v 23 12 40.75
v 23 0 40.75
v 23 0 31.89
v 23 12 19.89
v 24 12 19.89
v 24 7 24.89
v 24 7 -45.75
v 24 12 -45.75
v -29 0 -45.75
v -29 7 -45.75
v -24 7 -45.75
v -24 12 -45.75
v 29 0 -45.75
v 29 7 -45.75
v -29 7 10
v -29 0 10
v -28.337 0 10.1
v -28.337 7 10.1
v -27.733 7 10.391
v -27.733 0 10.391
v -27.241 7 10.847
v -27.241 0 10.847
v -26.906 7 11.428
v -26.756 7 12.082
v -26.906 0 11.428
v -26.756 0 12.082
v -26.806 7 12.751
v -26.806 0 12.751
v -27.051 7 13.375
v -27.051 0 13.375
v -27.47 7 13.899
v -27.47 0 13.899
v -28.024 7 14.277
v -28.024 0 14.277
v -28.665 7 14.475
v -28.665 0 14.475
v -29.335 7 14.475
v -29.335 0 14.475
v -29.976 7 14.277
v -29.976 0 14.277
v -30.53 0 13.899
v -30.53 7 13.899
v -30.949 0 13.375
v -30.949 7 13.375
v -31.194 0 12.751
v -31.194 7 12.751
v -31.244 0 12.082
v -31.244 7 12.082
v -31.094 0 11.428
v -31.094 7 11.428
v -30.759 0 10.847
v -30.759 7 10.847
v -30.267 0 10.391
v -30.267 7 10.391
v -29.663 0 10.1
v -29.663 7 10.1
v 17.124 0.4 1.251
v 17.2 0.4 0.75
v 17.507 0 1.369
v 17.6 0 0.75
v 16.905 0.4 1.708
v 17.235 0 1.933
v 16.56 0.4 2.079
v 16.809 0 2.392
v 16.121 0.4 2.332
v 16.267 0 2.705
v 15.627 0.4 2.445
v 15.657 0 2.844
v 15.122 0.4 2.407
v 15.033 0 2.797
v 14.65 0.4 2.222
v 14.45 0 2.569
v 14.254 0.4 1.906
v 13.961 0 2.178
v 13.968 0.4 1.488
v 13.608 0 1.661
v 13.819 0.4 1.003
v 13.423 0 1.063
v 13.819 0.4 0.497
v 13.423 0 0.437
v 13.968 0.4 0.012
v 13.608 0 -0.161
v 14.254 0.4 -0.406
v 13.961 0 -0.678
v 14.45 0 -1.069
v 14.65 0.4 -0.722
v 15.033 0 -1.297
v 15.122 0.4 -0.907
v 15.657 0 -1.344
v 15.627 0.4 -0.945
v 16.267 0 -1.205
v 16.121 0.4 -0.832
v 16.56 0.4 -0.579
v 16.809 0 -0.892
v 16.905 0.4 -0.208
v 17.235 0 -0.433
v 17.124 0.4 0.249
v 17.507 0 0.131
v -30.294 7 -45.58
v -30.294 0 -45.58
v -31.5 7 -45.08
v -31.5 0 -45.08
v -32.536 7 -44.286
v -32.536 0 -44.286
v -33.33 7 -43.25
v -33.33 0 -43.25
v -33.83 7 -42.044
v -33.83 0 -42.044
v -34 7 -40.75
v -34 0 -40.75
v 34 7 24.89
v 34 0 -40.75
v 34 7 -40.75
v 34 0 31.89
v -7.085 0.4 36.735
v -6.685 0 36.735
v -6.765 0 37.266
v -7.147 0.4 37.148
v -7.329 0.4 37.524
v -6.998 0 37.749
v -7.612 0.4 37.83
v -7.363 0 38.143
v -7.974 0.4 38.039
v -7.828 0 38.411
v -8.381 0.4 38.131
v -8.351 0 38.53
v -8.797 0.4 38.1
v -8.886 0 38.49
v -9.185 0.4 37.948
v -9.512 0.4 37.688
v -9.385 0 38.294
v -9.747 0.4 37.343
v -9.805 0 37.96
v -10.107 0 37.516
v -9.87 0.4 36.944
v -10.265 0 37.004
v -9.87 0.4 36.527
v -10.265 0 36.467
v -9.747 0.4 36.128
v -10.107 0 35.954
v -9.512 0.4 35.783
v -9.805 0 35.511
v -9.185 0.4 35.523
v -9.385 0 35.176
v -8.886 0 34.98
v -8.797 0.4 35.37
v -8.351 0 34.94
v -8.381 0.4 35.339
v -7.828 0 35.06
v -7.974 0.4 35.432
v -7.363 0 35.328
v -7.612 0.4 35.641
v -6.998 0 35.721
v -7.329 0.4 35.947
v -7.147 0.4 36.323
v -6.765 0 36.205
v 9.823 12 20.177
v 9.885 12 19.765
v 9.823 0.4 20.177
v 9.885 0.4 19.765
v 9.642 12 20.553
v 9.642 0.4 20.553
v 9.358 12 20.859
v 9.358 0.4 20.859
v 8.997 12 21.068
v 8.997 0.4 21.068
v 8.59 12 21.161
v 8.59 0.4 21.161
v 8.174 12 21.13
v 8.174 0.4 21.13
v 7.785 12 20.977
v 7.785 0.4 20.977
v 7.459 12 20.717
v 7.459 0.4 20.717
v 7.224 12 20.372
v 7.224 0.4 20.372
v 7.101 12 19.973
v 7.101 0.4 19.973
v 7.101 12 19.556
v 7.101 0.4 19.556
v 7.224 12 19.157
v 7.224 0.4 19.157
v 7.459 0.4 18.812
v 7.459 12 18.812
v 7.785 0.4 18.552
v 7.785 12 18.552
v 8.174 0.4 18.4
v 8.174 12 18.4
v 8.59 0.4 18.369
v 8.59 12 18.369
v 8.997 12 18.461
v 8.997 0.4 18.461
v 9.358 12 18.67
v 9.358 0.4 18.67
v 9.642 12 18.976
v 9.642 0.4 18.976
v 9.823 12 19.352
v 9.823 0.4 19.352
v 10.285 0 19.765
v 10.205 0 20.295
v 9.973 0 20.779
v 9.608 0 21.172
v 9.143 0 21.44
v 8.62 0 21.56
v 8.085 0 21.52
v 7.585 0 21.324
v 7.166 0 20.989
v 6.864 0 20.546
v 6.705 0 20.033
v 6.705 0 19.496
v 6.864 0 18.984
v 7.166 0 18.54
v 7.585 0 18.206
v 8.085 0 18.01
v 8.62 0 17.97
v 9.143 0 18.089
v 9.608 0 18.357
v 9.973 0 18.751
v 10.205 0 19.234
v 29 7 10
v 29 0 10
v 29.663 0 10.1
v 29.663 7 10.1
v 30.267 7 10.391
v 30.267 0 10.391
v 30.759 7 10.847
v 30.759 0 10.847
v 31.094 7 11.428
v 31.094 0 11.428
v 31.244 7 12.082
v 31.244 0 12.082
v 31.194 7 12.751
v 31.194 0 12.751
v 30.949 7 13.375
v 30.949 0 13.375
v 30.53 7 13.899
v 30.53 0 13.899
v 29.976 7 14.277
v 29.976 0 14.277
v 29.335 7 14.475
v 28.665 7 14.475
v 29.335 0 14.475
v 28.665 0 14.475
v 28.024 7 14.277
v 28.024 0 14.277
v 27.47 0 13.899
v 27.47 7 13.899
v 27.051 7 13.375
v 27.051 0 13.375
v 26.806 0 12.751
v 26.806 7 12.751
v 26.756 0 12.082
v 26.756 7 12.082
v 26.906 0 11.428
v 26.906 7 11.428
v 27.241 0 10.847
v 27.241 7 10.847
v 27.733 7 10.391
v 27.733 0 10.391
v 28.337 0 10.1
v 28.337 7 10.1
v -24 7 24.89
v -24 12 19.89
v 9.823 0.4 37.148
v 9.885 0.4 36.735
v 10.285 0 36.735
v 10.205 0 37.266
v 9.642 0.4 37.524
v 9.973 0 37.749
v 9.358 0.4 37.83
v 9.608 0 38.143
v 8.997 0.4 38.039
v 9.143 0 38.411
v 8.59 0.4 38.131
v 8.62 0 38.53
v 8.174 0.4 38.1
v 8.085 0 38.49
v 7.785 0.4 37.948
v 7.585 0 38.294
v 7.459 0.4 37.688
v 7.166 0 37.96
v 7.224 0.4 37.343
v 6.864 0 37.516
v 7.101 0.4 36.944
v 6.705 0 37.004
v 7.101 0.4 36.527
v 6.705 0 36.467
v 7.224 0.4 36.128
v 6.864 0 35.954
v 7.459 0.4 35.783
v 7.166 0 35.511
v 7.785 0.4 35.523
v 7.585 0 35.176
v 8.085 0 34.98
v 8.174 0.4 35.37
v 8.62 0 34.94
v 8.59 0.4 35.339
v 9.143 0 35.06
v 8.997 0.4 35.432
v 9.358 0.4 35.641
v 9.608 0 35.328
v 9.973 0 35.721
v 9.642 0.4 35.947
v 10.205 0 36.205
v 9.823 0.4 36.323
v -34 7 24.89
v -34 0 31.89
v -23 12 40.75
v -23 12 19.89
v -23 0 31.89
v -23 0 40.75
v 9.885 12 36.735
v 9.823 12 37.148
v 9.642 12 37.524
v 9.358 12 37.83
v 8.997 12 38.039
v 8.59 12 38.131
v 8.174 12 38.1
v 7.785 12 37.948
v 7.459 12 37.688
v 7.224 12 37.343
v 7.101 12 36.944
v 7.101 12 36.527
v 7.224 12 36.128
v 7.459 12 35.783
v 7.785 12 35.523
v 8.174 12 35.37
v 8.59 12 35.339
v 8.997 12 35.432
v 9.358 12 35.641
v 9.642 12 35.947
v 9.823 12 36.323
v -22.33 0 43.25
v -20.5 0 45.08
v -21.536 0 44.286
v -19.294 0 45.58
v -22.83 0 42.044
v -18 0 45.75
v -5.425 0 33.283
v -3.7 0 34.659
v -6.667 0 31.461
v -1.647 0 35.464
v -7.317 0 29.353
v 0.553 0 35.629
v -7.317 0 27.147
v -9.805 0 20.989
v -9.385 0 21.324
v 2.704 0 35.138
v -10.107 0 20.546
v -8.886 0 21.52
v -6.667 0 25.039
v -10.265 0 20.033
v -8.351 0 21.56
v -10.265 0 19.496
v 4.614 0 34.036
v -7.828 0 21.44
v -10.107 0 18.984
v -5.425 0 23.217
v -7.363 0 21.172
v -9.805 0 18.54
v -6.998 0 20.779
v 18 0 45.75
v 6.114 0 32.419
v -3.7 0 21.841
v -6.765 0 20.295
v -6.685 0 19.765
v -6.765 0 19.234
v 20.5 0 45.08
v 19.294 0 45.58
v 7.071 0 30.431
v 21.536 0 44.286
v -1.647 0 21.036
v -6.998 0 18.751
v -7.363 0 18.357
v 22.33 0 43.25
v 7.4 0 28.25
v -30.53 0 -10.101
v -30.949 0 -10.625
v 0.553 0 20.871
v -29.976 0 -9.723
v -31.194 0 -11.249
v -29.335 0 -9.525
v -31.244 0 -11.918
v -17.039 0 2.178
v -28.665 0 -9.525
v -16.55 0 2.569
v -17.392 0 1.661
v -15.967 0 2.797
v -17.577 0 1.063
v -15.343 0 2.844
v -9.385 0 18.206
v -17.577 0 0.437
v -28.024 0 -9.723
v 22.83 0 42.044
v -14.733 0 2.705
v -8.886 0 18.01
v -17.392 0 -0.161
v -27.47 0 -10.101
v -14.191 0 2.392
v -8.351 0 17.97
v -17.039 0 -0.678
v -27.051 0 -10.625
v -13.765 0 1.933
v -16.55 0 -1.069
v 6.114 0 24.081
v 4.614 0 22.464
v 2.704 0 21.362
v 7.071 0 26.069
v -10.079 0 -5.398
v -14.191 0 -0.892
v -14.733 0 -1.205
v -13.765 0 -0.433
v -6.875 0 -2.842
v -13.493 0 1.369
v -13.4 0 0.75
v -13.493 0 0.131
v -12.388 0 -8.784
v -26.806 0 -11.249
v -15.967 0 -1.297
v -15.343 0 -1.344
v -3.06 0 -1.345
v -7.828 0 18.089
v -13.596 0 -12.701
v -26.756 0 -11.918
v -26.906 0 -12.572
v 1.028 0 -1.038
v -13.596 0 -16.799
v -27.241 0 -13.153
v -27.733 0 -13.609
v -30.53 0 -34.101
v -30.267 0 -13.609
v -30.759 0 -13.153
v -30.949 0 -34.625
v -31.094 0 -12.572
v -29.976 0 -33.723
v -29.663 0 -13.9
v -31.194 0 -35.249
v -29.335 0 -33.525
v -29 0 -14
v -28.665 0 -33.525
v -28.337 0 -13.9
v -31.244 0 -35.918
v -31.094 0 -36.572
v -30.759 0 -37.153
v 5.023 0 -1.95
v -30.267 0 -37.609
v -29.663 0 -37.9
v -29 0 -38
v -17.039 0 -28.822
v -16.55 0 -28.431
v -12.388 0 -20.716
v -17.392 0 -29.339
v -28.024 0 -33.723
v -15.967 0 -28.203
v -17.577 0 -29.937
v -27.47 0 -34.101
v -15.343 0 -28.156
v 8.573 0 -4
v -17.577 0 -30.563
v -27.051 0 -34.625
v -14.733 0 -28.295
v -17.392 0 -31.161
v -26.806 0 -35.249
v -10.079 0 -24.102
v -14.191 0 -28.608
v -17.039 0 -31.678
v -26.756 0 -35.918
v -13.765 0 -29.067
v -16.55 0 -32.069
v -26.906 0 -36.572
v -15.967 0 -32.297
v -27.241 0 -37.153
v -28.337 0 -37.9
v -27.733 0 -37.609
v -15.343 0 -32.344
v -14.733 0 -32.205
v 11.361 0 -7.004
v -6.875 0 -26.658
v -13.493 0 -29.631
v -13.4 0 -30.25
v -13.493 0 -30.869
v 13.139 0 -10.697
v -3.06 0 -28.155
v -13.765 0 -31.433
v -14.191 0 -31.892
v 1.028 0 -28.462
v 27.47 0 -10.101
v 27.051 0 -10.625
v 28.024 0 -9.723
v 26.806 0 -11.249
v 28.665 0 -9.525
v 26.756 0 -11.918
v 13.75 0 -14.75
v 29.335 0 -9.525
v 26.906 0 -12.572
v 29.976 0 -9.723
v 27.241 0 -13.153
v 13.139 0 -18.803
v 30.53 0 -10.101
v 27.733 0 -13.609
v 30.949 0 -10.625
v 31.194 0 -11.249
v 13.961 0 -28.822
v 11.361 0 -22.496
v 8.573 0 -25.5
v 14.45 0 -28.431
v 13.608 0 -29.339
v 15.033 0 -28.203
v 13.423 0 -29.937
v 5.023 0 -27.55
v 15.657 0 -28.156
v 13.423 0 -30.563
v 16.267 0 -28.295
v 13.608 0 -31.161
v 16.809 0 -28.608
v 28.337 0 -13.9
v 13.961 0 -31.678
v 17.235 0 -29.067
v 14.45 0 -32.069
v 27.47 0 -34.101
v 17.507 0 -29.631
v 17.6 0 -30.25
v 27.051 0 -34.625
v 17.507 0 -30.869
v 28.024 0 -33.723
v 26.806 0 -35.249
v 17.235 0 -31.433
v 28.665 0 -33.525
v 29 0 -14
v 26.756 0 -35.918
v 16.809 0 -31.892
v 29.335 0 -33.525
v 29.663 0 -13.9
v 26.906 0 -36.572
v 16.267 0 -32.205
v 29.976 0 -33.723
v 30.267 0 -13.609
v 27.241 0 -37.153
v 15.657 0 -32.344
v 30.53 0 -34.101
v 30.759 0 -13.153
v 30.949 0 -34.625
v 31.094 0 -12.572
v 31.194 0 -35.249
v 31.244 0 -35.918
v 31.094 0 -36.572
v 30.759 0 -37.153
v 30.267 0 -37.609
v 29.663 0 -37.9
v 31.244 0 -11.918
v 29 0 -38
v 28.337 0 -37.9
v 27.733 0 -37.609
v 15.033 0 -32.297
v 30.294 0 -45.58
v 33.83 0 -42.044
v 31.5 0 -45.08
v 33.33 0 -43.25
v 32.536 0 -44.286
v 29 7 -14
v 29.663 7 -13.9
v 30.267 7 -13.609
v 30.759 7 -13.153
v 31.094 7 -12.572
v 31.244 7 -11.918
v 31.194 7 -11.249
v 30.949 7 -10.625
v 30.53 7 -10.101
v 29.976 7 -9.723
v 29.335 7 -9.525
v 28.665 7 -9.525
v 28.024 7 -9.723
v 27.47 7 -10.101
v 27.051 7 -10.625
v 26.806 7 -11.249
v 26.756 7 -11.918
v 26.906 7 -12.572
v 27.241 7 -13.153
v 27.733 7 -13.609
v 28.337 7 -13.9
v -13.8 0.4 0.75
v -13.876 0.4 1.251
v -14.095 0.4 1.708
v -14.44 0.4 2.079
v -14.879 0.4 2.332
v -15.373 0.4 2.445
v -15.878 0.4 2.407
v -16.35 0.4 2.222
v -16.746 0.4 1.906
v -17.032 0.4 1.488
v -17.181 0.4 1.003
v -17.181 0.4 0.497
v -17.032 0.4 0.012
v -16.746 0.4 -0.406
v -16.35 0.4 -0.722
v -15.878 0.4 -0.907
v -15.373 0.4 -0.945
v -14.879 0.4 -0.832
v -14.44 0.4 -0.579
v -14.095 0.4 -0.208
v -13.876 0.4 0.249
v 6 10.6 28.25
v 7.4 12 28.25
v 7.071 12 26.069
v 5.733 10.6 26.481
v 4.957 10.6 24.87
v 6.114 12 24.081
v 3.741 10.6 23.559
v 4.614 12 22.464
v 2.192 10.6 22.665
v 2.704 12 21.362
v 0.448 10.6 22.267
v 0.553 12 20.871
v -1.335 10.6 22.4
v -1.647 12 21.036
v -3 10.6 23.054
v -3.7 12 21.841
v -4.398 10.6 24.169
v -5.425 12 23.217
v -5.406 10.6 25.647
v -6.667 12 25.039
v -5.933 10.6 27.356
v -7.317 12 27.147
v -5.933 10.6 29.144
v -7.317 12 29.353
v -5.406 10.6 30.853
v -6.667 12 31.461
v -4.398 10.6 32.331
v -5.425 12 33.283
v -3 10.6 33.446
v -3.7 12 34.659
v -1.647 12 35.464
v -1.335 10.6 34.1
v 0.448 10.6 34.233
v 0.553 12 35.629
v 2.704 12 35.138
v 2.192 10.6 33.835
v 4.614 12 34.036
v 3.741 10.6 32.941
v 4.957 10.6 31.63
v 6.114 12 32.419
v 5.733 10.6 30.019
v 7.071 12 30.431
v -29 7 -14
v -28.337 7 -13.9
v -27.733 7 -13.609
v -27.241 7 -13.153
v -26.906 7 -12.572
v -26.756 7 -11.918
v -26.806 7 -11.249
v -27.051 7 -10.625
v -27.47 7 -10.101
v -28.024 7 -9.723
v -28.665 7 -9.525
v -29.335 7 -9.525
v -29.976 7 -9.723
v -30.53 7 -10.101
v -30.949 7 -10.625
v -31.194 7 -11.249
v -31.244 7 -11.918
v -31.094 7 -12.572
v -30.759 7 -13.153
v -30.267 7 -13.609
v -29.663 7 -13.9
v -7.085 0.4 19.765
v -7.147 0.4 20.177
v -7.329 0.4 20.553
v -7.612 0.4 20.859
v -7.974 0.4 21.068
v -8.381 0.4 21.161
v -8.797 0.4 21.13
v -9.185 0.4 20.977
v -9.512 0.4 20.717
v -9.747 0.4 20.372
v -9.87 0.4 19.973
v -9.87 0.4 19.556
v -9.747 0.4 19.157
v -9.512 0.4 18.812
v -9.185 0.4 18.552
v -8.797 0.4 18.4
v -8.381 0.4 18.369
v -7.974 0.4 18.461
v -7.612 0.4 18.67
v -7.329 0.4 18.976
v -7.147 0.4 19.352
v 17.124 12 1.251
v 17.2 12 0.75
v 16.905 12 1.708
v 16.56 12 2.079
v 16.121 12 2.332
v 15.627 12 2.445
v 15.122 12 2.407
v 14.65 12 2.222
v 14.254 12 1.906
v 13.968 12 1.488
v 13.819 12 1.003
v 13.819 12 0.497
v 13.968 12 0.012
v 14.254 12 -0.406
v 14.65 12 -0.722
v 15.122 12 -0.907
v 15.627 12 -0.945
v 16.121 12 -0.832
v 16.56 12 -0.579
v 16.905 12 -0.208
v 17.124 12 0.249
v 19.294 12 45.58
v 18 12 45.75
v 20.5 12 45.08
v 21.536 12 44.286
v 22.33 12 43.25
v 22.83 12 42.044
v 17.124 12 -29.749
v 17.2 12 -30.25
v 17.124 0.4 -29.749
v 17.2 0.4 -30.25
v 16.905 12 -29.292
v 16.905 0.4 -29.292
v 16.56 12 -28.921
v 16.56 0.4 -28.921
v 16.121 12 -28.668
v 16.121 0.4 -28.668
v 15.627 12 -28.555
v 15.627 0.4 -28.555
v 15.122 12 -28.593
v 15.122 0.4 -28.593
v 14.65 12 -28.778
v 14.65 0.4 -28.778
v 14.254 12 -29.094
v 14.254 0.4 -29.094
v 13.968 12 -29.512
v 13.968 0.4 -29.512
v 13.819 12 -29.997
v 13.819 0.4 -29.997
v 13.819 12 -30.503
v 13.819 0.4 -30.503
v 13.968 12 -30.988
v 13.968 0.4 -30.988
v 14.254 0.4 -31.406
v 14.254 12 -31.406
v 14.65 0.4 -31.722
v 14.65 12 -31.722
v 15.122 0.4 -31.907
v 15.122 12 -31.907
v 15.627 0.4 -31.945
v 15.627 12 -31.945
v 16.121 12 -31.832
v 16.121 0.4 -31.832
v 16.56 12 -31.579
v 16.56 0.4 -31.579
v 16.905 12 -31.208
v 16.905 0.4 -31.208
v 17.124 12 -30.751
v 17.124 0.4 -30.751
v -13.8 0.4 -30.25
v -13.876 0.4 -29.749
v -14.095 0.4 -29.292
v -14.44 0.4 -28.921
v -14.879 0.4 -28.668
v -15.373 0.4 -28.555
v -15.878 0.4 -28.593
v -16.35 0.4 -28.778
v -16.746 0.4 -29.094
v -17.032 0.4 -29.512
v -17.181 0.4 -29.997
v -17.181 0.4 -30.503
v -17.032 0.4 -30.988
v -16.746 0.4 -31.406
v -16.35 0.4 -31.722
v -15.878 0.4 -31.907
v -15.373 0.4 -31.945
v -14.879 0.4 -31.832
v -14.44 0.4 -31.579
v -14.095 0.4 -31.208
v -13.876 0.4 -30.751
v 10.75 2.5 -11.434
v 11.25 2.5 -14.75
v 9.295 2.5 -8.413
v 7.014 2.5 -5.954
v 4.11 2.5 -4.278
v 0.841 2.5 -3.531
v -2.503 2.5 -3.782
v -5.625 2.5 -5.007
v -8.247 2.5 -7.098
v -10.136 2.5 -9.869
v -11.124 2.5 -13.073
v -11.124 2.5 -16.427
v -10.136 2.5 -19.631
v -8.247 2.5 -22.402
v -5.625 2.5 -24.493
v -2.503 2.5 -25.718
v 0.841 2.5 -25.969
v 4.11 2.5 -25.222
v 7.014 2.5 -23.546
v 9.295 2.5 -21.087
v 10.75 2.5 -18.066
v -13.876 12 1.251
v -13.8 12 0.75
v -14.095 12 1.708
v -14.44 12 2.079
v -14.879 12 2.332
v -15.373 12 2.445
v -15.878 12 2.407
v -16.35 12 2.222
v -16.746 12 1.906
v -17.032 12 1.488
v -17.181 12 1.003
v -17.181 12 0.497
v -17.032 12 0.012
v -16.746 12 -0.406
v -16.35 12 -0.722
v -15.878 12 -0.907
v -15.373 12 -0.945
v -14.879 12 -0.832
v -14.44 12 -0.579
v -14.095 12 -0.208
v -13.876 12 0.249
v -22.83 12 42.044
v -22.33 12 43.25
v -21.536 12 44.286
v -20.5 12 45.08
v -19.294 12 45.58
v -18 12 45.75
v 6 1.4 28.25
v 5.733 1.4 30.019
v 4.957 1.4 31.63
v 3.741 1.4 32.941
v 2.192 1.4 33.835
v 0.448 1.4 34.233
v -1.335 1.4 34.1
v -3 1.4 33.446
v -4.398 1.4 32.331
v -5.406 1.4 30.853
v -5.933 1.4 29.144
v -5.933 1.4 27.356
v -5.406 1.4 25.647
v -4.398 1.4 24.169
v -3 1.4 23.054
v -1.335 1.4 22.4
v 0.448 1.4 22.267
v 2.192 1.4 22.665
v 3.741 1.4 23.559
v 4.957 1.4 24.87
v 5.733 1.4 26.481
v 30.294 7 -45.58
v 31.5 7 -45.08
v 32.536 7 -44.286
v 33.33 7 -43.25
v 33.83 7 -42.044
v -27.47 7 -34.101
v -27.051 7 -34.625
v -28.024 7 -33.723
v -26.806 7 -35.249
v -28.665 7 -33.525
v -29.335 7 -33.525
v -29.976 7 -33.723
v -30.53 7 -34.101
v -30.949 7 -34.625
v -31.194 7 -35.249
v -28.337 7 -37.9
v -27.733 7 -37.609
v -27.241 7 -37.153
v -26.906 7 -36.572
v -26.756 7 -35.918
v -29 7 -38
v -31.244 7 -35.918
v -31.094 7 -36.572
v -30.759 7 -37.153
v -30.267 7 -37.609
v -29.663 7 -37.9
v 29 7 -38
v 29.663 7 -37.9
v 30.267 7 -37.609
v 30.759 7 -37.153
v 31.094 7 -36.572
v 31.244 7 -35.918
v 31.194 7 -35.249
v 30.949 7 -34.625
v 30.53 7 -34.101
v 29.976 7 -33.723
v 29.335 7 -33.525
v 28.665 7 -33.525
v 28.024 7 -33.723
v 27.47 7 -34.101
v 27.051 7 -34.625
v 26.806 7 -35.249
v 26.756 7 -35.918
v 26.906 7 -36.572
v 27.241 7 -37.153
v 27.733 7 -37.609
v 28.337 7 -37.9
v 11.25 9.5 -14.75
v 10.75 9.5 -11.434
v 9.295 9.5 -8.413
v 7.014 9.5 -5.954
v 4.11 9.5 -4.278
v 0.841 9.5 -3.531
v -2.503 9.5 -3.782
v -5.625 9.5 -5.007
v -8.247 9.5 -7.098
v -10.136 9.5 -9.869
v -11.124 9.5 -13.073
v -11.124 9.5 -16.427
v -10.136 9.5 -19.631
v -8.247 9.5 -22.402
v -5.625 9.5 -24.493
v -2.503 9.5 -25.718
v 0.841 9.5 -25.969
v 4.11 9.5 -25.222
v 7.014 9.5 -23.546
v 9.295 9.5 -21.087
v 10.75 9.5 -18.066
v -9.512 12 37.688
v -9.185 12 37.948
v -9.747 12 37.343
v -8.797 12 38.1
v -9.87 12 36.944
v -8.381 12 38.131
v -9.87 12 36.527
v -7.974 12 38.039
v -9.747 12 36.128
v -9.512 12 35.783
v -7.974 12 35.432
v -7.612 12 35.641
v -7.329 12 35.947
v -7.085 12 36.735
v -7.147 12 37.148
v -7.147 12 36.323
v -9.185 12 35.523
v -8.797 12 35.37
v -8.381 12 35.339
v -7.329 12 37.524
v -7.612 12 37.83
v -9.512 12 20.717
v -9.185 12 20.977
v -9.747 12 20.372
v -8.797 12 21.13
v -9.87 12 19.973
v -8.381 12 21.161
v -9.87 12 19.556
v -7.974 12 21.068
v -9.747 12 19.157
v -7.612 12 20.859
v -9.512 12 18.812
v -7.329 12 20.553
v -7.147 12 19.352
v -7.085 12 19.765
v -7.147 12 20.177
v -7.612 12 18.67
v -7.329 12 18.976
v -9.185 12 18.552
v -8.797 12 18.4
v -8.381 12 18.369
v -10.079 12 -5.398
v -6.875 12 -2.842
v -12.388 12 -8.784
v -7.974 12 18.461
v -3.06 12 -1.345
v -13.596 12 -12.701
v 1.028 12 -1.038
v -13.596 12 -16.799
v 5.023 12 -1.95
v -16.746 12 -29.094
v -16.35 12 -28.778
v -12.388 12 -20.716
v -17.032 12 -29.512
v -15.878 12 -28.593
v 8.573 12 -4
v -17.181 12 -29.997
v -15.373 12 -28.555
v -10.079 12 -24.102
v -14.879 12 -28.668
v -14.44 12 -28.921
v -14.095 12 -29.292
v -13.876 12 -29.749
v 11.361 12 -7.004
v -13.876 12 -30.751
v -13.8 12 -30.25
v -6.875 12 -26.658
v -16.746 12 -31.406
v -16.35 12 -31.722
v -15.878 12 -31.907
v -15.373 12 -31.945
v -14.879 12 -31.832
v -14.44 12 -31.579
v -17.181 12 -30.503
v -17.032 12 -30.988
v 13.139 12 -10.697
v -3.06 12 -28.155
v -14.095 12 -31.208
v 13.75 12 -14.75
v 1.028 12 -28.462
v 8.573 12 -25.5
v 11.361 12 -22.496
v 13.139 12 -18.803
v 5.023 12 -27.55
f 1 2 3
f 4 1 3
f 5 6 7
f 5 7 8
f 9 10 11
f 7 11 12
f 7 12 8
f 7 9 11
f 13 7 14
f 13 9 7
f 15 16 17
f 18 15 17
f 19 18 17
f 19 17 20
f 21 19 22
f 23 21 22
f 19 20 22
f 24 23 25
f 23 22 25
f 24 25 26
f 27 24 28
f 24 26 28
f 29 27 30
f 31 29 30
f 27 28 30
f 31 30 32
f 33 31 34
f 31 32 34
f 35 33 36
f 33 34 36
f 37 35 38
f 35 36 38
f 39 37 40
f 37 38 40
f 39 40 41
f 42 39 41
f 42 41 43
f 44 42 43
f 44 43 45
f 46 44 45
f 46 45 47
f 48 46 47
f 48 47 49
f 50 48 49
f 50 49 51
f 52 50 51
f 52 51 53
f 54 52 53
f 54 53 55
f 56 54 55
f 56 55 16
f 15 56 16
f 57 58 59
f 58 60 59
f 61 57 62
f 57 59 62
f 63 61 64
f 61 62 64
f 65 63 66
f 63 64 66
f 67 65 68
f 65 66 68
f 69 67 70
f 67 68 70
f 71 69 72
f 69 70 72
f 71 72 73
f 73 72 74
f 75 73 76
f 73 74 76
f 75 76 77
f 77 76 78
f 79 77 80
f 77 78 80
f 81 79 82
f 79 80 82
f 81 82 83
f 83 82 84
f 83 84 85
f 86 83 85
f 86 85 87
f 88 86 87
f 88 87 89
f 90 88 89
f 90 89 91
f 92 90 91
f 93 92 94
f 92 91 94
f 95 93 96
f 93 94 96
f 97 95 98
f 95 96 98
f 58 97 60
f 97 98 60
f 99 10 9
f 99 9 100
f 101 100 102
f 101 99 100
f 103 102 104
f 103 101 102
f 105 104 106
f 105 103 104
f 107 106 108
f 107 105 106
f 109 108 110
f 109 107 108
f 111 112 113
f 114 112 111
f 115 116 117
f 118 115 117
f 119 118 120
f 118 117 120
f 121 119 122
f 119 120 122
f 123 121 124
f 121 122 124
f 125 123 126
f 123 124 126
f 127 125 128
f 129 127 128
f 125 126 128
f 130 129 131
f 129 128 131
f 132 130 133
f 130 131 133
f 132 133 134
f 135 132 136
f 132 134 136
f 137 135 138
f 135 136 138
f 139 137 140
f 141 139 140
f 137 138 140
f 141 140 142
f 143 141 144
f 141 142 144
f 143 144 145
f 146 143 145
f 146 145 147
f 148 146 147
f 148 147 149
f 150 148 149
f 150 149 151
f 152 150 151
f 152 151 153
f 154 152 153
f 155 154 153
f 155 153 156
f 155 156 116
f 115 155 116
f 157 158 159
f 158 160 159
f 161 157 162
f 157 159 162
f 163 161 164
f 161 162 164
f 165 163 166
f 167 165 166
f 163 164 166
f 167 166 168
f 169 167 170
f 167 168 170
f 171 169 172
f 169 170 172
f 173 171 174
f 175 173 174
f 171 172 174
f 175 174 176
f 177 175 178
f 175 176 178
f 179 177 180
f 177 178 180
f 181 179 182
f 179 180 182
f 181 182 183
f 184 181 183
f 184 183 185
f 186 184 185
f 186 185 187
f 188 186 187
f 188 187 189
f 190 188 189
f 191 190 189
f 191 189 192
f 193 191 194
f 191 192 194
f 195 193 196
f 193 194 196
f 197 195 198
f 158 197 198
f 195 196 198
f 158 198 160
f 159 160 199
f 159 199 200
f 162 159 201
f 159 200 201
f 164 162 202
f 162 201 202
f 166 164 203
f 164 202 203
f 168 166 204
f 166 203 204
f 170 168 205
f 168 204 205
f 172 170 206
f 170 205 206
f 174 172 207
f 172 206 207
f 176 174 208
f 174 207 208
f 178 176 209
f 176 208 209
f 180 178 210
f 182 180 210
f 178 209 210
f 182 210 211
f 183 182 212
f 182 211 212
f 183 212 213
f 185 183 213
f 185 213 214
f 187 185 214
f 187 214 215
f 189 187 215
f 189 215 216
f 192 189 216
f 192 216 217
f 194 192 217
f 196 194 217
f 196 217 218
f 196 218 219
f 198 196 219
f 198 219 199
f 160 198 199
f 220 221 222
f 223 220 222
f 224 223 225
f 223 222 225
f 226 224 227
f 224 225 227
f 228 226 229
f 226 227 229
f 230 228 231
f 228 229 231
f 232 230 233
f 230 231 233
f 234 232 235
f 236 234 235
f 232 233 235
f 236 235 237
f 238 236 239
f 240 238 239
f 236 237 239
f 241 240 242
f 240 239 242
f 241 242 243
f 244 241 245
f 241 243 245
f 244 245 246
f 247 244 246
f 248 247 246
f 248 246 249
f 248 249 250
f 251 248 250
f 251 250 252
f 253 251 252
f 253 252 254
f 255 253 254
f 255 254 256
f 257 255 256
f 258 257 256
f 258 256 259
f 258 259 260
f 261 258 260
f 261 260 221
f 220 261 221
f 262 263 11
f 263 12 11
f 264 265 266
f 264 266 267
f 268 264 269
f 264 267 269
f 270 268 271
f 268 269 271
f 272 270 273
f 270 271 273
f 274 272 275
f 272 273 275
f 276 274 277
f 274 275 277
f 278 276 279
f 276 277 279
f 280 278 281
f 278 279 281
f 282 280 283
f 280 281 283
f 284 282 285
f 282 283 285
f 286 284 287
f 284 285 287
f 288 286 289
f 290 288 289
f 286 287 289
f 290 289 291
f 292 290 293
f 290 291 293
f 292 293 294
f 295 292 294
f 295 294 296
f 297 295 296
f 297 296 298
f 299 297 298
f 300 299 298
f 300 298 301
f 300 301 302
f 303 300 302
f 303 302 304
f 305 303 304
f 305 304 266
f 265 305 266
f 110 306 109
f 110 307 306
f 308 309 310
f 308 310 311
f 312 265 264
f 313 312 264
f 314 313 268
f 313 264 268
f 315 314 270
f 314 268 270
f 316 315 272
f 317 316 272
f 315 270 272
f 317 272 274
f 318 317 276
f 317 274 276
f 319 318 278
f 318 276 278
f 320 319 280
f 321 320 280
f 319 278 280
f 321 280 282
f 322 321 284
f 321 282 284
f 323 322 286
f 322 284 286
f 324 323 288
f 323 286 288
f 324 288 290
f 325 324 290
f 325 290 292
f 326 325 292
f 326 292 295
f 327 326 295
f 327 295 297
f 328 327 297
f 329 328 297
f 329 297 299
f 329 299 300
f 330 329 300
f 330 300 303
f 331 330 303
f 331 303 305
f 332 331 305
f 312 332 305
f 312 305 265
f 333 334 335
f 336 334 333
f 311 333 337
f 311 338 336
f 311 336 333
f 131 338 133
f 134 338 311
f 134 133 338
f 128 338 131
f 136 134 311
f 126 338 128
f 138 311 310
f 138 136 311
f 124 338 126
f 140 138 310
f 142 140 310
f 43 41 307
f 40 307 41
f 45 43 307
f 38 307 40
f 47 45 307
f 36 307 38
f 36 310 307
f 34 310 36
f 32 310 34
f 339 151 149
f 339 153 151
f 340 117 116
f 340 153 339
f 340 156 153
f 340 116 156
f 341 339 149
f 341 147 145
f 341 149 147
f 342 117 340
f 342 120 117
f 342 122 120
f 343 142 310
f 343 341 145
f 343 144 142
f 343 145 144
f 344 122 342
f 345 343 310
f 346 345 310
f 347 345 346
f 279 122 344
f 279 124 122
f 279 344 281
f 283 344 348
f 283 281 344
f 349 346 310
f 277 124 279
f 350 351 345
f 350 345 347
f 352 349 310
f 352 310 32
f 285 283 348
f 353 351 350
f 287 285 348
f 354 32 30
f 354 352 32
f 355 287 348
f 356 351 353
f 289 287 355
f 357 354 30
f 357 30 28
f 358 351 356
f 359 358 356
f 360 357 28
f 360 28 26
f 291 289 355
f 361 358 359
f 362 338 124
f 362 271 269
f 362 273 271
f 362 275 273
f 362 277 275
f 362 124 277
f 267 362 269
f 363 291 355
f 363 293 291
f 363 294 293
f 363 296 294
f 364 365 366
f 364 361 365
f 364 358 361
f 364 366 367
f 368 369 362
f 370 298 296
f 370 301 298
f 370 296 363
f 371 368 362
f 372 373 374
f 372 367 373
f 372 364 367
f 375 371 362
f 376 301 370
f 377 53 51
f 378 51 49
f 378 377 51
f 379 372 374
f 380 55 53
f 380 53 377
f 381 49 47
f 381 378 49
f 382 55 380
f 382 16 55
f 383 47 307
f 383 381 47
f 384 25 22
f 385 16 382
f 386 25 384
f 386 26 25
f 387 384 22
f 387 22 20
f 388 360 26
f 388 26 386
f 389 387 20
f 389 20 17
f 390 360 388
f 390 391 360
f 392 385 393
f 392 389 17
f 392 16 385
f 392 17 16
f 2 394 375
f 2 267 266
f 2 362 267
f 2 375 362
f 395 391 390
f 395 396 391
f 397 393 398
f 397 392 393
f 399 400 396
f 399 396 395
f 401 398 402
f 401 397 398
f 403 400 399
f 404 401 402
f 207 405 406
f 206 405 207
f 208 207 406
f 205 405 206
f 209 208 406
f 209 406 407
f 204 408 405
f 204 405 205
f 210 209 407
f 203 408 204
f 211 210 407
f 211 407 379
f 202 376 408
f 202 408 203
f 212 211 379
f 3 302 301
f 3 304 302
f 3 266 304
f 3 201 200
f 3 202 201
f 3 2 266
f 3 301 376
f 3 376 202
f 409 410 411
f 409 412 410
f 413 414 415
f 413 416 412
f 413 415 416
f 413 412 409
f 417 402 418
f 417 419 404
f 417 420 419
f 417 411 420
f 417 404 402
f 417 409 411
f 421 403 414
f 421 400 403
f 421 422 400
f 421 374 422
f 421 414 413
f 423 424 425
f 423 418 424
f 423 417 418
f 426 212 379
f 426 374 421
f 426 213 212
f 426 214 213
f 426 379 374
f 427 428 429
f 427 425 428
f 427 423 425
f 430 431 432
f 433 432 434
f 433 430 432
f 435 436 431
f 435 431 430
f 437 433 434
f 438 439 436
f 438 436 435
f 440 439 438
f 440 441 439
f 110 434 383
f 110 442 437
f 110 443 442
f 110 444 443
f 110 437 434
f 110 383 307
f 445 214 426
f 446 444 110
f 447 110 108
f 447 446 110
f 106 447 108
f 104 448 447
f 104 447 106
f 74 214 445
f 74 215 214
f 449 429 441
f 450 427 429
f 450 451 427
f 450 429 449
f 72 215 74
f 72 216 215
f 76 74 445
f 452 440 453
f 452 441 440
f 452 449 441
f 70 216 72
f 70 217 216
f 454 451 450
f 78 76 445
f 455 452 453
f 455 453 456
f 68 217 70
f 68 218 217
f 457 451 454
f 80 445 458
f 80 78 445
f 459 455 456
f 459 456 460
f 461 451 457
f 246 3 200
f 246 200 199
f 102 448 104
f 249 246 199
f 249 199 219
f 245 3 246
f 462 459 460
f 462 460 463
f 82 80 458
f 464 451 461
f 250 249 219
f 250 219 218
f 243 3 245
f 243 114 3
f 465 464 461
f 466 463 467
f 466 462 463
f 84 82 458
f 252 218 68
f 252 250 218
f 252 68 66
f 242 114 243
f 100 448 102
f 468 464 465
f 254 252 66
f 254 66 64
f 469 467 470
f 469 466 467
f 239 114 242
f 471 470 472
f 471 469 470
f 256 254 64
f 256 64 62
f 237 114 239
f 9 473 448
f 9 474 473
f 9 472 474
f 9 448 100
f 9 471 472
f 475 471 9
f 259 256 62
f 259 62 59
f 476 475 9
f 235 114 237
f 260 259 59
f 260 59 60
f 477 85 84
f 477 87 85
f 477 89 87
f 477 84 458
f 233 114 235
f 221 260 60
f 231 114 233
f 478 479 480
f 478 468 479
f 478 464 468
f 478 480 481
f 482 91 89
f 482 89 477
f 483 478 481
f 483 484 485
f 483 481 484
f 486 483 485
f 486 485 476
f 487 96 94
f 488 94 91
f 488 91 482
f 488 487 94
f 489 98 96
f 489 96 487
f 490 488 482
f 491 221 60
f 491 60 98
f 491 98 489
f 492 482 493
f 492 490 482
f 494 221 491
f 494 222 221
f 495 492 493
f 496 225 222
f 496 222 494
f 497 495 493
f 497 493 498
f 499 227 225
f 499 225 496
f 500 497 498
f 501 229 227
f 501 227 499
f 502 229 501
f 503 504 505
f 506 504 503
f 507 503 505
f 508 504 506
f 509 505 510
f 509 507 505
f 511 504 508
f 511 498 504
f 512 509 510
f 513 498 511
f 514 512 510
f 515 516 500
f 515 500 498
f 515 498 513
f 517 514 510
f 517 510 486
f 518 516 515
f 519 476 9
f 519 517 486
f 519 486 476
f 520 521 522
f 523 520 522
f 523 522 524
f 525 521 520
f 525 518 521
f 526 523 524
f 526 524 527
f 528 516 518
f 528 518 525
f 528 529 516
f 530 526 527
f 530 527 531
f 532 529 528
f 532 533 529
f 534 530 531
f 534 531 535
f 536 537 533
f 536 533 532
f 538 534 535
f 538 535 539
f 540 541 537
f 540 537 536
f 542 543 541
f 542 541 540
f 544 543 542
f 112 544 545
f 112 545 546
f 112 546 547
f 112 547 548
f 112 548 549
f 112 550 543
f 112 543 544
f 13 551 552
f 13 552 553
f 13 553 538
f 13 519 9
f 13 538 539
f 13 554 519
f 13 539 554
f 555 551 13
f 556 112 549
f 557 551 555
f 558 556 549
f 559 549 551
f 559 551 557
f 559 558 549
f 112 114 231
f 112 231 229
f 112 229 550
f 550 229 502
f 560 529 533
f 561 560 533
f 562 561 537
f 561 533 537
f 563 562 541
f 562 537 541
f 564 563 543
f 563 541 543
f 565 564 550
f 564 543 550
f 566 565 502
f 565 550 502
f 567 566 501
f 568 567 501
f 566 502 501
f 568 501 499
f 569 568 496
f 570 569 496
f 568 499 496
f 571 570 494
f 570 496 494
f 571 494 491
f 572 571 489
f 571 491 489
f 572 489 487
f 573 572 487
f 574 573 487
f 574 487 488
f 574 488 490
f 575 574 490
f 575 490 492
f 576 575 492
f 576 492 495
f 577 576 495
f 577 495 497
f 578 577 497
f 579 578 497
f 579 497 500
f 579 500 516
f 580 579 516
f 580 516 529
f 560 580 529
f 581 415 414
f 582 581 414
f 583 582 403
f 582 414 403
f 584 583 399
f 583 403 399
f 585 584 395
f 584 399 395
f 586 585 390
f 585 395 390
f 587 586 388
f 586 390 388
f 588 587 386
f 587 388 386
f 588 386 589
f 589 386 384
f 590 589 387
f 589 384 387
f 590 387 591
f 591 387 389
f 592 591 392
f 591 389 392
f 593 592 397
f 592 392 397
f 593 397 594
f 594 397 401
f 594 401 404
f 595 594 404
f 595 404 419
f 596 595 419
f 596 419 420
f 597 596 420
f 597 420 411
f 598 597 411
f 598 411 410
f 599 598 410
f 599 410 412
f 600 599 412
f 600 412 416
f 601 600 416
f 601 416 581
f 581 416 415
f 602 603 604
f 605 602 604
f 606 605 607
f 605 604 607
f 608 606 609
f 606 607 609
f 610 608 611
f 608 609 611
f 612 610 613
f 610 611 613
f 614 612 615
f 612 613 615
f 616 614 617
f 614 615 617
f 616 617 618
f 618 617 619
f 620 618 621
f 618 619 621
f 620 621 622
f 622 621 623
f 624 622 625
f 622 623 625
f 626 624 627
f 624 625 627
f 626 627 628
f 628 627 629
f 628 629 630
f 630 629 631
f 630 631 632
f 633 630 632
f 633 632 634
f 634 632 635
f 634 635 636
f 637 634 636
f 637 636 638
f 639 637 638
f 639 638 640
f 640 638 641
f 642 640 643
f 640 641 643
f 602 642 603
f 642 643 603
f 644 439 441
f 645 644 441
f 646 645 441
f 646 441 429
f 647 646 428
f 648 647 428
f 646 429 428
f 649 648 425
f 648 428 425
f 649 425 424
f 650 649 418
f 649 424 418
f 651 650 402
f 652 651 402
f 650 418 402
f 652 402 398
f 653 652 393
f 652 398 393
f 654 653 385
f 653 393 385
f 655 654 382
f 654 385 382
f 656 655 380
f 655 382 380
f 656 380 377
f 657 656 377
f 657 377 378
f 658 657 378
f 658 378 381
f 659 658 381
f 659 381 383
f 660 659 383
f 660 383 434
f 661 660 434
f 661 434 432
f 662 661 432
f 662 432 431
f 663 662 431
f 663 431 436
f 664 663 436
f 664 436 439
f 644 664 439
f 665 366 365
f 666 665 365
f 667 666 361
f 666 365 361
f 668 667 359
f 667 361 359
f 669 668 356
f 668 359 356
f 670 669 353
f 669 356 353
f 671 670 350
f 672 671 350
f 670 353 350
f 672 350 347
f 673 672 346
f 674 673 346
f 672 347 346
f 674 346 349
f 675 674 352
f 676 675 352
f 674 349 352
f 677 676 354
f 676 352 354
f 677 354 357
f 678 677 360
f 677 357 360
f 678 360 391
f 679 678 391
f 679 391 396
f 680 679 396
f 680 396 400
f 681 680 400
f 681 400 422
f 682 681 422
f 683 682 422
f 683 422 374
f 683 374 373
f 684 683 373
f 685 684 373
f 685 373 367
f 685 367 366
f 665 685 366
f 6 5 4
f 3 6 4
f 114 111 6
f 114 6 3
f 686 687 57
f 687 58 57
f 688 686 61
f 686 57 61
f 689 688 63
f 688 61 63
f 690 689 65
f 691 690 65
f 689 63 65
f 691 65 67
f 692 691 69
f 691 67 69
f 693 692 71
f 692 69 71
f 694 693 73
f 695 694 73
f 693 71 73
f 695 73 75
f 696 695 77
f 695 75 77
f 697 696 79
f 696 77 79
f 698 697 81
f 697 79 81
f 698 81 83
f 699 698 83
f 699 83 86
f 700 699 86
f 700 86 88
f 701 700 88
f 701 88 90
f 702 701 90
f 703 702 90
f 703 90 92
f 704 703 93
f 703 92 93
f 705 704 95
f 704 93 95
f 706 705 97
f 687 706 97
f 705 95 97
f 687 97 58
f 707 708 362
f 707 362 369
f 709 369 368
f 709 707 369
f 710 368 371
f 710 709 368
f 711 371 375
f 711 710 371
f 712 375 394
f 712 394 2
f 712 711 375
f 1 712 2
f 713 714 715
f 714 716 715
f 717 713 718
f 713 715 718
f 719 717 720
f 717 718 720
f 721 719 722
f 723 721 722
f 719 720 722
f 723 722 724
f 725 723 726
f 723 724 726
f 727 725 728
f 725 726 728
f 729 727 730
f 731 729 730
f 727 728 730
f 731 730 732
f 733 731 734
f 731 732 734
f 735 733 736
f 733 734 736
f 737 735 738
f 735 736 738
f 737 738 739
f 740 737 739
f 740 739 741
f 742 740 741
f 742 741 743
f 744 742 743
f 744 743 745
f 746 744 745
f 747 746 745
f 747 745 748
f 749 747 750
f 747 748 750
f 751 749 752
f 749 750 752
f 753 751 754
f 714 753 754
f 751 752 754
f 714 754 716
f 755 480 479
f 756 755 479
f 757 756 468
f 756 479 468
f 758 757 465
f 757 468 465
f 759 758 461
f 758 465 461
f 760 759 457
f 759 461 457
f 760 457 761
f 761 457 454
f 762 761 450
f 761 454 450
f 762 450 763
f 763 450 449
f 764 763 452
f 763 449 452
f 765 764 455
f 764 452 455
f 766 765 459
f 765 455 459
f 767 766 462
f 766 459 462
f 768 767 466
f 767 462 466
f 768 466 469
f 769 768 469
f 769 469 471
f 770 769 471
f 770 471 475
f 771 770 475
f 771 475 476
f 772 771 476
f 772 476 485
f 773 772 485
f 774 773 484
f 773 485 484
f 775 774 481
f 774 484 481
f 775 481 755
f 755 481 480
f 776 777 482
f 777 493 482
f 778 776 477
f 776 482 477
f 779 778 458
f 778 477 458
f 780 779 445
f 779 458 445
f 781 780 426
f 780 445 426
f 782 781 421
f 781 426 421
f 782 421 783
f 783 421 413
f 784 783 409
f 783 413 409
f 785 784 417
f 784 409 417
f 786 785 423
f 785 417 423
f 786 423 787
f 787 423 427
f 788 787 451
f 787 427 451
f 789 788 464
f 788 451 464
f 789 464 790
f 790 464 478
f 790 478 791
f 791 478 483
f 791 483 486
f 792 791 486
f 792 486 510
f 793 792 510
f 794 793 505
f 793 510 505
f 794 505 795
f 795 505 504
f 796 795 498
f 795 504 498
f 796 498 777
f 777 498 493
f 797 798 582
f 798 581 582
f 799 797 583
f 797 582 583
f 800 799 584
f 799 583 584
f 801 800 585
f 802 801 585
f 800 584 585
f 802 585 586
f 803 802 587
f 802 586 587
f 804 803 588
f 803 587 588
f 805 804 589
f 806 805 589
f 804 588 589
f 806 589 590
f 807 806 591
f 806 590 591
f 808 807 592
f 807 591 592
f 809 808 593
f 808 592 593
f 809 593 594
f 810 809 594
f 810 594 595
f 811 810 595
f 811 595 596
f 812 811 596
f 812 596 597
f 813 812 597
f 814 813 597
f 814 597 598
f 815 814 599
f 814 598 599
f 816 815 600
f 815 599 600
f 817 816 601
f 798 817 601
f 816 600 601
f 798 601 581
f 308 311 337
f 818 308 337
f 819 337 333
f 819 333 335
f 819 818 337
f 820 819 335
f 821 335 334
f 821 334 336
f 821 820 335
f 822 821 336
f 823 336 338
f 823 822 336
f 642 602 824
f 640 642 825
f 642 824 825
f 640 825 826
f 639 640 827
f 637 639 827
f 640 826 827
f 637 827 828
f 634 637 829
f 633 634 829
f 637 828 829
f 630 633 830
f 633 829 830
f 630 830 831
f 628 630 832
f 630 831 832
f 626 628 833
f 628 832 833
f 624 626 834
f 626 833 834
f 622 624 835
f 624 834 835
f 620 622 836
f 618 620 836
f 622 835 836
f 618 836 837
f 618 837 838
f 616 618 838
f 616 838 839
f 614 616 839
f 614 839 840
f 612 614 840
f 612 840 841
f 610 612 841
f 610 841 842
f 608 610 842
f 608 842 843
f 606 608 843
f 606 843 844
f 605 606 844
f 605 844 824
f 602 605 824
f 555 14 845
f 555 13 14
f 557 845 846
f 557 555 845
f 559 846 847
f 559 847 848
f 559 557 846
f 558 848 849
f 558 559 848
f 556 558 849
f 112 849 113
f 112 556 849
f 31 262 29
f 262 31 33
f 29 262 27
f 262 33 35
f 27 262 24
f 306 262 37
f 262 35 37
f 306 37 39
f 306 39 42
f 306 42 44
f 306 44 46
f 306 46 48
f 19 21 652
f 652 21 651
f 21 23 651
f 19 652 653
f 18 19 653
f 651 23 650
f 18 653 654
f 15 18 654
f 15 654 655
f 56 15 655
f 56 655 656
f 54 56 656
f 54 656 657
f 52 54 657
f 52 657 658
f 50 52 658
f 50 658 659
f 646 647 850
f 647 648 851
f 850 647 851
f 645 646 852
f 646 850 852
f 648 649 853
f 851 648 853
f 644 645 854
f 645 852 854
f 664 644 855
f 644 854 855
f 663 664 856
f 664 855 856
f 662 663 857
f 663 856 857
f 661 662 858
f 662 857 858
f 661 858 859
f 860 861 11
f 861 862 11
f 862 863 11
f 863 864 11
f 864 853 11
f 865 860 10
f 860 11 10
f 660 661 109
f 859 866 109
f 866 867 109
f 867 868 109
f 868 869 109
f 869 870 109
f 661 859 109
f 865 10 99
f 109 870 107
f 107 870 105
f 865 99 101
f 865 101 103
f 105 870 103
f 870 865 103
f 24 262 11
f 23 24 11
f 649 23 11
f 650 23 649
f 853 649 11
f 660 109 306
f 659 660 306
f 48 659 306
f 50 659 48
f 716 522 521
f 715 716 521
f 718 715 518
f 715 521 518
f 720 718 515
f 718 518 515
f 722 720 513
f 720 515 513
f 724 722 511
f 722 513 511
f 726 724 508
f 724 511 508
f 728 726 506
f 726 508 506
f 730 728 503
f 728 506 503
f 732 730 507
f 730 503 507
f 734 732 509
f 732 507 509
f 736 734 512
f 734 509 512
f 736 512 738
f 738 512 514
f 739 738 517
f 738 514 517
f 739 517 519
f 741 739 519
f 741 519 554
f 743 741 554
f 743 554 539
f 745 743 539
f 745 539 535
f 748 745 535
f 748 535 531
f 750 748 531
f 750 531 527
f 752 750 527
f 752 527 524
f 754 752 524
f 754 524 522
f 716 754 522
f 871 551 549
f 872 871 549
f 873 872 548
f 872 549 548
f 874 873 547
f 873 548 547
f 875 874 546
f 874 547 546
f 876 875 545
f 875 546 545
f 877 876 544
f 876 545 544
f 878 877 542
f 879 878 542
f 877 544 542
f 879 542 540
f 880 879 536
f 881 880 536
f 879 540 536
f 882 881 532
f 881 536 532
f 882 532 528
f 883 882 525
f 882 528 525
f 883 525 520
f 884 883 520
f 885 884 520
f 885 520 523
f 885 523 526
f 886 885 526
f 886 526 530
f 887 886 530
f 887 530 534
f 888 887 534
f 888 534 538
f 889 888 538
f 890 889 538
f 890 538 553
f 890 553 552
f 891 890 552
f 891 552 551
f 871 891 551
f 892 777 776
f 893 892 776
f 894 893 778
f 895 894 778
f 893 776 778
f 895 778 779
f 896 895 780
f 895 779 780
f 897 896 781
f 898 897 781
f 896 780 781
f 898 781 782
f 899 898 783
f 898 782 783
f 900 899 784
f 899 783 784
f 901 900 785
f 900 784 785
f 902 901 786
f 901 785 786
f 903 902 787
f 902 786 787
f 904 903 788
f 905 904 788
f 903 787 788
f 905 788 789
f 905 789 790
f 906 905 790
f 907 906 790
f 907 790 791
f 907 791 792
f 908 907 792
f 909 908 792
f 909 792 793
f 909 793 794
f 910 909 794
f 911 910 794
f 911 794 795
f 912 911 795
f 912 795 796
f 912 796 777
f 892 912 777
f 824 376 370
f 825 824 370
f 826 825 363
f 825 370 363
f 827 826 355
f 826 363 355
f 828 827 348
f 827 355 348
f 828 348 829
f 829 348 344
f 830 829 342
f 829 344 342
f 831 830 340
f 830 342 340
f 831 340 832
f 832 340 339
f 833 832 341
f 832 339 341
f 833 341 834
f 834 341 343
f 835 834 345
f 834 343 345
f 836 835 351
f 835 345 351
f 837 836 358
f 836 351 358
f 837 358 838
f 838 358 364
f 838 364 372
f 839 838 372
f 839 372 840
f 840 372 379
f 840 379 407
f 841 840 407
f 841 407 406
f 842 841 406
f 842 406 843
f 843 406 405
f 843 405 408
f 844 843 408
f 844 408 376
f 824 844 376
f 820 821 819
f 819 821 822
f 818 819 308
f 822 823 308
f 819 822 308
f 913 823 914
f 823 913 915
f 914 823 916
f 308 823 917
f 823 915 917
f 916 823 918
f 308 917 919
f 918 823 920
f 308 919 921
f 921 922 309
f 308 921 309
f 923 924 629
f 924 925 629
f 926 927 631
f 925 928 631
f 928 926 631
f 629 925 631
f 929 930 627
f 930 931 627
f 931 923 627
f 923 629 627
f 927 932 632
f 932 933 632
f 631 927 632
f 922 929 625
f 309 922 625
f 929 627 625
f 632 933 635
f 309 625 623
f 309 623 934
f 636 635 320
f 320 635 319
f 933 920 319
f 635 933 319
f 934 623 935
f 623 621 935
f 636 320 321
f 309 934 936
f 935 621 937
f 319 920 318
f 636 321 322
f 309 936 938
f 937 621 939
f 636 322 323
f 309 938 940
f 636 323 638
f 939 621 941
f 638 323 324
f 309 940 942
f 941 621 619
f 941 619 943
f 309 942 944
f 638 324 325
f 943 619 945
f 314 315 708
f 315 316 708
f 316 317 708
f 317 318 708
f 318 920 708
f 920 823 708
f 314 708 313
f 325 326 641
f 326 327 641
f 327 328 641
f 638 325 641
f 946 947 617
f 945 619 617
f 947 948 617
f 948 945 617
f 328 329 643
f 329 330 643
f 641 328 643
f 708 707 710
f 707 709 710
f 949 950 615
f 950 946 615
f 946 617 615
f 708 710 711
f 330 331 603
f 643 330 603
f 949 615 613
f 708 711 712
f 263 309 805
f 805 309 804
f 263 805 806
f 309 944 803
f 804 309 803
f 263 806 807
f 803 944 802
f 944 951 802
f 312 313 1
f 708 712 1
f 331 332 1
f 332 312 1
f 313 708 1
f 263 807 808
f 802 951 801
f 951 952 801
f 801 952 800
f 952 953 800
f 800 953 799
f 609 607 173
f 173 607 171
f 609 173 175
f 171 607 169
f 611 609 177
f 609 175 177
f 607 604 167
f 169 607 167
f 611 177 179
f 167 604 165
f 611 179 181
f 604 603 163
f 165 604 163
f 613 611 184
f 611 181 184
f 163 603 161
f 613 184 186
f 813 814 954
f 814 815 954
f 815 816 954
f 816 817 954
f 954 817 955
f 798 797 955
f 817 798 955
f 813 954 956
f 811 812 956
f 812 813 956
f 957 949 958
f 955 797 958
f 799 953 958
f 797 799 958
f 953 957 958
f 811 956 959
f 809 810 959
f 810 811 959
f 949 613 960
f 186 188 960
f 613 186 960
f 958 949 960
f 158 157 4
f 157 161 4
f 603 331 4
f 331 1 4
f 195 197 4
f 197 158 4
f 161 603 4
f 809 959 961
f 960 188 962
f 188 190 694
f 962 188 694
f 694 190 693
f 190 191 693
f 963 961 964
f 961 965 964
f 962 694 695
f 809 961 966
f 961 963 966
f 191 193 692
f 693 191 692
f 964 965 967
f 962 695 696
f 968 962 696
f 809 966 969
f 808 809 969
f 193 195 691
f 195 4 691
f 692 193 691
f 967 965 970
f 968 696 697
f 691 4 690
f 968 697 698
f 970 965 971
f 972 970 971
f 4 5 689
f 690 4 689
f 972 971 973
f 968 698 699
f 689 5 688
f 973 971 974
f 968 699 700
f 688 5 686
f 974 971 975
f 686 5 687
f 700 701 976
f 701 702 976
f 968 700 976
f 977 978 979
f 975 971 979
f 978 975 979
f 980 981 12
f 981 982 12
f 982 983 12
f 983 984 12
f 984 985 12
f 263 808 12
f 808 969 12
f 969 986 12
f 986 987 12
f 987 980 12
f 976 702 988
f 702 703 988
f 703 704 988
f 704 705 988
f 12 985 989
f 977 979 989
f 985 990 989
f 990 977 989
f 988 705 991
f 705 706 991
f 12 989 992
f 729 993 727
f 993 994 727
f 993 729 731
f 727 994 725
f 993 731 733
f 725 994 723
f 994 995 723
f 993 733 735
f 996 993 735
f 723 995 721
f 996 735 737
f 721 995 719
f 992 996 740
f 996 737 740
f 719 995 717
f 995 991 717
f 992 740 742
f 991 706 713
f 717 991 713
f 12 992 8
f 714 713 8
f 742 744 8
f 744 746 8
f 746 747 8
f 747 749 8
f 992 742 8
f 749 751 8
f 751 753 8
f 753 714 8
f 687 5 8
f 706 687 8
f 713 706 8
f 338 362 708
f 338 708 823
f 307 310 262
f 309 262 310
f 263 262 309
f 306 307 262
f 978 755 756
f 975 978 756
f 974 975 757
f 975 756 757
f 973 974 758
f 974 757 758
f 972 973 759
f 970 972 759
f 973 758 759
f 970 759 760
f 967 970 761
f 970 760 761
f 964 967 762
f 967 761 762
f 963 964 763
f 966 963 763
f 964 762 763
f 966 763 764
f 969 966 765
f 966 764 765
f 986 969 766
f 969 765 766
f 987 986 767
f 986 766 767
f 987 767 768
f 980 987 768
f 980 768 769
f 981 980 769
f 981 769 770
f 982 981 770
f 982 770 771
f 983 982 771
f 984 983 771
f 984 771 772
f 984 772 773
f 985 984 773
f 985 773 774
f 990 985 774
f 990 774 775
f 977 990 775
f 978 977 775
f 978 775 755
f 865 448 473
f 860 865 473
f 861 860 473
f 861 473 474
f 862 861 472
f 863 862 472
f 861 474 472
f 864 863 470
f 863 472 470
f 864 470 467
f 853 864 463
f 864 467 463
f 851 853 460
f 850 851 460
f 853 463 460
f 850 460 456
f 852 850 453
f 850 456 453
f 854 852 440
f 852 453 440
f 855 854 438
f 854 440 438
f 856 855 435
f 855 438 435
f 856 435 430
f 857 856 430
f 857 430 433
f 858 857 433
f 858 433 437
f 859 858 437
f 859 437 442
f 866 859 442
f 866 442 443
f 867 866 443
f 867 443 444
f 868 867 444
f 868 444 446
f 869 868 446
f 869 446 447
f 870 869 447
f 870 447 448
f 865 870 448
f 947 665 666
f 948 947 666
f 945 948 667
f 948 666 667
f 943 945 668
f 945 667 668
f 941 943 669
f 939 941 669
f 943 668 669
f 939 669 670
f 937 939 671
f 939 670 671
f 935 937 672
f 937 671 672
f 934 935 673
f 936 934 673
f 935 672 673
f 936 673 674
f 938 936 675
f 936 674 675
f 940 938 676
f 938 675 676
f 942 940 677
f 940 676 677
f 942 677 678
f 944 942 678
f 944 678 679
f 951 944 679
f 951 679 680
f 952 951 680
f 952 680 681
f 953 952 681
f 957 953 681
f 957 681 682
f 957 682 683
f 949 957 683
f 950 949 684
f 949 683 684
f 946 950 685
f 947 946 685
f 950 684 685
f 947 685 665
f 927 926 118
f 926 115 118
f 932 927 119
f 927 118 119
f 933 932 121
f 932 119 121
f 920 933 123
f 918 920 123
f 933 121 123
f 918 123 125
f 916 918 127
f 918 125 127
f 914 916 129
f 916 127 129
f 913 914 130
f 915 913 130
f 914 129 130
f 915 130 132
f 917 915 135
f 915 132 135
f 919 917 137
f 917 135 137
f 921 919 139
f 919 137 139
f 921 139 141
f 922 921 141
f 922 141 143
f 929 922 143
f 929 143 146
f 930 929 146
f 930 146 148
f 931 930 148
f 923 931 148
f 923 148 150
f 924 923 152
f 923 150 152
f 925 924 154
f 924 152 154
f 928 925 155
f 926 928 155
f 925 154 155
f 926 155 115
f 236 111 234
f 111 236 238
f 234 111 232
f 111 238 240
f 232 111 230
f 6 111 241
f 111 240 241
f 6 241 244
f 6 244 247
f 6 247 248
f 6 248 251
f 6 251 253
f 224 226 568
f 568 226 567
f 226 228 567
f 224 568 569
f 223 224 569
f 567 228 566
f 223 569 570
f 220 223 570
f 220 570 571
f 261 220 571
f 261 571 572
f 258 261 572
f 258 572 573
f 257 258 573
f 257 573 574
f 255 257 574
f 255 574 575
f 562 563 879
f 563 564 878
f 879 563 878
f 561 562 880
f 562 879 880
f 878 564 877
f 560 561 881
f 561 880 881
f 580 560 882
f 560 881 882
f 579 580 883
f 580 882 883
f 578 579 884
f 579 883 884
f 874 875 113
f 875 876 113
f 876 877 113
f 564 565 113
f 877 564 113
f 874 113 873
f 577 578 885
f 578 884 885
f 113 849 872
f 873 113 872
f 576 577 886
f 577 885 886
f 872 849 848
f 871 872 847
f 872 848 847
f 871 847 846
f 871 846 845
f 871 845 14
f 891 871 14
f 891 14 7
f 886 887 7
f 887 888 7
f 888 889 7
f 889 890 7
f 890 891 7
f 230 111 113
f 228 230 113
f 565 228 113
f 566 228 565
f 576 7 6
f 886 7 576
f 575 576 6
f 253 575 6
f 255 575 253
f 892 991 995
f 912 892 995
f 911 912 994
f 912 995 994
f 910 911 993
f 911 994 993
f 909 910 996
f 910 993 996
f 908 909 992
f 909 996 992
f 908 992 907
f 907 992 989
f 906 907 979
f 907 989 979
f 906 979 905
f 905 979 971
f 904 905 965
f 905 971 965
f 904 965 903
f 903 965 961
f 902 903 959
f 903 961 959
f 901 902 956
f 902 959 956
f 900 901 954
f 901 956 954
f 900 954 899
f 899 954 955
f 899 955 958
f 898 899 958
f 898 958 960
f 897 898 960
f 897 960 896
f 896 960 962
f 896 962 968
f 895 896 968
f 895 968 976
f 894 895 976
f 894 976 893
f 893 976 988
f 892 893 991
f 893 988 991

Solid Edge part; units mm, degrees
sketch "Sketch1" plane through (0, 0, 0) normal (0, -1, 0) x (1, 0, 0)
  line L0 (-34, -45.75) -> (34, -45.75)
  line L1 (34, -45.75) -> (34, 45.75)
  line L2 (34, 45.75) -> (-34, 45.75)
  line L3 (-34, 45.75) -> (-34, -45.75)
  dimension "D1" = 68
  dimension "D2" = 91.5
extrude "Protrusion1" add sketch "Sketch1" against normal blind 12
sketch "Sketch2" plane through (0, 0, 0) normal (0, -1, 0) x (1, 0, 0)
  circle A0 centre (0, -14.75) radius 11.25
  circle A1 centre (-15.5, 0.75) radius 1.7
  circle A2 centre (-15.5, -30.25) radius 1.7
  circle A3 centre (15.5, -30.25) radius 1.7
  circle A4 centre (15.5, 0.75) radius 1.7
  dimension "D1" = 22.5
  dimension "D2" = 3.4
  dimension "D3" = 31
  dimension "D4" = 31
extrude "Cutout1" cut sketch "Sketch2" against normal through all
sketch "Sketch3" plane through (0, 0, 0) normal (0, -1, 0) x (1, 0, 0)
  circle A0 centre (8.4853, 36.7353) radius 1.4
  circle A1 centre (8.4853, 19.7647) radius 1.4
  circle A2 centre (-8.4853, 19.7647) radius 1.4
  circle A3 centre (-8.4853, 36.7353) radius 1.4
  circle A4 centre (0, 28.25) radius 6
  dimension "D1" = 8.4853
extrude "Cutout2" cut sketch "Sketch3" against normal through all
sketch "Sketch4" plane through (-34, 6, 0) normal (-1, 0, 0) x (0, 0, -1)
  line L0 (-19.89, -6) -> (45.75, -71.64)
  line L1 (45.75, -71.64) -> (45.75, -6)
  line L2 (45.75, -6) -> (-19.89, -6)
  dimension "D1" = 25.86
extrude "Extrusionsausprägung_2" add sketch "Sketch4" against normal blind 10
mirror "Mirror1" about plane through (0, 0, 0) normal (1, 0, 0) of "Extrusionsausprägung_2"
sketch "Sketch5" plane through (-34, 38.82, 0) normal (-1, 0, 0) x (0, 0, -1)
  circle A0 centre (33.7465, 1.4635) radius 1.875
  circle A1 centre (19.6043, 15.6057) radius 1.875
  dimension "D1" = 3.75
  dimension "D2" = 20
  dimension "D3" = 42.14
  dimension "D4" = 32.83
extrude "Extrusionsausschnitt_3" cut sketch "Sketch5" against normal blind 14
sketch "Sketch6" plane through (-34, 38.82, 0) normal (-1, 0, 0) x (0, 0, -1)
  line L0 (45.75, -38.82) -> (-31.89, 38.82)
  line L1 (-31.89, 38.82) -> (-17.75, 38.82)
  line L2 (-17.75, 38.82) -> (45.75, -24.68)
  line L3 (45.75, -24.68) -> (45.75, -38.82)
  dimension "D1" = 14.14
extrude "Extrusionsausprägung_4" add sketch "Sketch6" along normal blind 44
mirror "Mirror2" about plane through (0, 0, 0) normal (1, 0, 0) of "Extrusionsausprägung_4"
sketch "Sketch7" plane through (-54, 31.75, -14) normal (0, -0.7071068, -0.7071068) x (1, 0, 0)
  circle A0 centre (-14, 10.2613) radius 4
  circle A1 centre (-14, -19.7387) radius 4
  dimension "D1" = 8
  dimension "D2" = 34.64
  dimension "D3" = 30
  dimension "D4" = 10
extrude "Cutout3" cut sketch "Sketch7" against normal up to next
mirror "Mirror3" about plane through (0, 0, 0) normal (1, 0, 0) of "Cutout3"
sketch "Sketch8" plane through (-78, 38.82, -6.93) normal (-1, 0, 0) x (0, 0.7071068, -0.7071068)
  line L0 (29.953, 0) -> (42.4264, 12.4734)
  dimension "D1" = 60
extrude "Cutout4" cut sketch "Sketch8" against normal through all material side at (-78, 60.05, -36.93)
sketch "Sketch9" plane through (78, 30, -5.18) normal (1, 0, 0) x (0, -0.7071068, 0.7071068)
  line L0 (30.4551, -4.9992) -> (47.4257, -4.9992)
  line L1 (47.4257, -4.9992) -> (57.2262, -14.7997)
  line L2 (57.2262, -14.7997) -> (48.7409, -23.285)
  line L3 (48.7409, -23.285) -> (30.4551, -4.9992)
extrude "Extrusionsausschnitt_6" cut sketch "Sketch9" against normal blind 55
mirror "Mirror4" about plane through (0, 0, 0) normal (1, 0, 0) of "Extrusionsausschnitt_6"
fillet "Verrundung_1" radius 5 4 edges at (23, 6, 45.75) (-23, 6, 45.75) (34, 30, -45.75) (-34, 30, -45.75)
chamfer "Chamfer1" distance 0.5 angle 45 2 edges at (-34, 23.2143, -17.7293) (-34, 37.3565, -31.8715)
chamfer "Fase_2" distance 0.4 angle 45 4 edges at (-17.2, 0, -30.25) (-17.2, 0, 0.75) (13.8, 0, 0.75) (13.8, 0, -30.25)
chamfer "Fase_3" distance 0.4 angle 45 4 edges at (-9.8853, 0, 19.7647) (-9.8853, 0, 36.7353) (7.0853, 0, 36.7353) (7.0853, 0, 19.7647)
chamfer "Fase_4" distance 2.5 angle 45 2 edges at (-11.25, 0, -14.75) (0, 12, -3.5)
chamfer "Fase_5" distance 1.4 angle 45 2 edges at (-6, 0, 28.25) (0, 12, 34.25)
chamfer "Fase_7" distance 1 angle 45 4 edges at (-68, 34.3926, -2.5026) (-68, 55.6058, -23.7158) (68, 34.3926, -2.5026) (68, 55.6058, -23.7158)
sketch "Sketch10" plane through (-78, 30, -5.18) normal (-1, 0, 0) x (0, 0.7071068, -0.7071068)
  line L0 (-30.4551, -4.9992) -> (-20.4566, 4.9992)
extrude "Extrusionsausschnitt_8" cut sketch "Sketch10" against normal blind 44 material side at (-78, 11.95, 12.82)
mirror "Mirror5" about plane through (0, 0, 0) normal (1, 0, 0) of "Extrusionsausschnitt_8"
sketch "Sketch11" plane through (-78, 36, -11.18) normal (-1, 0, 0) x (0, 0.7071068, -0.7071068)
  line L0 (-38.9404, -4.9992) -> (7.4741, 41.4152)
extrude "Cutout6" cut sketch "Sketch11" against normal through all material side at (-78, 12.05, -12.93)
sketch "Sketch12" plane through (0, 0, 0) normal (0, -1, 0) x (0, 0, -1)
  circle A0 centre (35.75, -29) radius 2.25
  circle A1 centre (11.75, -29) radius 2.25
  circle A2 centre (-12.25, -29) radius 2.25
  dimension "D1" = 4.5
  dimension "D2" = 5
  dimension "D3" = 24
  dimension "D4" = 24
  dimension "D5" = 10
extrude "Cutout7" cut sketch "Sketch12" against normal through all
mirror "Mirror6" about plane through (0, 0, 0) normal (1, 0, 0) of "Cutout7"
sketch "Sketch13" plane through (0, 6, -45.75) normal (0, 0, -1) x (1, 0, 0)
  line L0 (-34, -6) -> (-24, -6)
  line L1 (-24, -6) -> (-24, -1)
  line L2 (-24, -1) -> (-34, -1)
  line L3 (-34, -1) -> (-34, -6)
  dimension "D1" = 10
  dimension "D2" = 5
extrude "Cutout8" cut sketch "Sketch13" against normal through all
mirror "Mirror7" about plane through (0, 0, 0) normal (1, 0, 0) of "Cutout8"
properties material "Nylon, allgemein"
